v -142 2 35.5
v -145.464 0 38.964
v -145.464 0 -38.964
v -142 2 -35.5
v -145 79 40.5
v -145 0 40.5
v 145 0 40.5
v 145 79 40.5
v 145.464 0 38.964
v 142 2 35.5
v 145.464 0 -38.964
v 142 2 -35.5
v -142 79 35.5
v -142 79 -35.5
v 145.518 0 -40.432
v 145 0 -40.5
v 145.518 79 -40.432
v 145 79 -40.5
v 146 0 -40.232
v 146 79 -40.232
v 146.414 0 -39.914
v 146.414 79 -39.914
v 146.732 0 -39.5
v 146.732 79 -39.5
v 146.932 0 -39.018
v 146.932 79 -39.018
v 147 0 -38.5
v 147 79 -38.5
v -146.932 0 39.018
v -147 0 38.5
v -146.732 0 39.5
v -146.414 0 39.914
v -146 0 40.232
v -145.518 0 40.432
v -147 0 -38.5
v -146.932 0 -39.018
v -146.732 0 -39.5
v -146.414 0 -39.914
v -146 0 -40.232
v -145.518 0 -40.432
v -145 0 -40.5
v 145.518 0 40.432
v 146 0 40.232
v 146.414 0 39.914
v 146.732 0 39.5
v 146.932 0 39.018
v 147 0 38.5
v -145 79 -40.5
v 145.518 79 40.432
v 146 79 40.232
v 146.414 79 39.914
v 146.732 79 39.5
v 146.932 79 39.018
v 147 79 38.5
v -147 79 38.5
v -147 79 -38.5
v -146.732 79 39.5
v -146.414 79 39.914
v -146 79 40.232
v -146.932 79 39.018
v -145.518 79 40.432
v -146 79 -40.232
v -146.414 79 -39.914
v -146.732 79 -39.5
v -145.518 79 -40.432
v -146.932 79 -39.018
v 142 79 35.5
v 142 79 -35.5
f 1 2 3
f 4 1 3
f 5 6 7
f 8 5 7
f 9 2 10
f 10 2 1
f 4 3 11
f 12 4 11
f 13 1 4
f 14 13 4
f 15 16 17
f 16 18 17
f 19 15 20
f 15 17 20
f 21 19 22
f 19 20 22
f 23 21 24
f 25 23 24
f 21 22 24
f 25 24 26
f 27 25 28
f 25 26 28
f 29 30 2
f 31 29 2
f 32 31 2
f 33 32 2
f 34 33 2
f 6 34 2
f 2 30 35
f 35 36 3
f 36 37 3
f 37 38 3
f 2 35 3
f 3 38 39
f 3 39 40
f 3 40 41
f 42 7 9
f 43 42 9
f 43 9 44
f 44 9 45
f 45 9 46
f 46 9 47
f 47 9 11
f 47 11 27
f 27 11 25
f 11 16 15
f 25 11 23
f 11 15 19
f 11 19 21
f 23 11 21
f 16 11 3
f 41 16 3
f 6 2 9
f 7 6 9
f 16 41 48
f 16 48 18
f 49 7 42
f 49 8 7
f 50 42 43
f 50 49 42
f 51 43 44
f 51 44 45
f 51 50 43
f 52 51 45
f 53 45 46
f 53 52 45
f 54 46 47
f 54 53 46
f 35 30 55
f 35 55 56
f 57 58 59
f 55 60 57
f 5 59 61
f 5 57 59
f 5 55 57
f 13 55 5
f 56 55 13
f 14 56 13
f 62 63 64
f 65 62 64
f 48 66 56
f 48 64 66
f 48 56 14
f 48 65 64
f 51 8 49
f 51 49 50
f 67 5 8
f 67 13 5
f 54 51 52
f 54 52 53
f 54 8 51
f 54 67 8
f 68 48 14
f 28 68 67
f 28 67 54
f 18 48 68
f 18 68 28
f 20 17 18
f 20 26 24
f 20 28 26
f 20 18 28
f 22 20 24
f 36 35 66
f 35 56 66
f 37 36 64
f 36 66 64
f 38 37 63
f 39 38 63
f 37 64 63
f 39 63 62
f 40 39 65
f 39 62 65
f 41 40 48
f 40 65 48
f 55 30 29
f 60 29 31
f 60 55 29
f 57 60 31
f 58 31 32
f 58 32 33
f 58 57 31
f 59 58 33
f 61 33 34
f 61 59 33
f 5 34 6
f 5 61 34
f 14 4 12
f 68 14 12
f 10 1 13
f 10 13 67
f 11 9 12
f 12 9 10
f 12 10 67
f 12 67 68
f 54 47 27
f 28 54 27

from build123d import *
from OCP.BRepFilletAPI import BRepFilletAPI_MakeChamfer

# Parameters (mm, degrees)
SKETCH1_W           = 294
SKETCH1_H           = 81
SKETCH1_W_2         = 284
SKETCH1_H_2         = 71
BOSS_EXTRUDE1_DEPTH = 79
FILLET1_R           = 2
CHAMFER1_SIZE       = 2
CHAMFER1_SIZE2      = 3.464101615


with BuildPart() as part:
    # Sketch1 → Boss-Extrude1 (new body)
    with BuildSketch(Plane(origin=(0, 0, 0), x_dir=(1, 0, 0), z_dir=(0, 1, 0))):
        Rectangle(SKETCH1_W, SKETCH1_H)
        Rectangle(SKETCH1_W_2, SKETCH1_H_2, mode=Mode.SUBTRACT)
    extrude(amount=BOSS_EXTRUDE1_DEPTH)

    # Fillet1
    fillet1_edges = [part.edges().sort_by_distance(p)[0] for p in [
        (-147, 39.5, -40.5),
        (147, 39.5, -40.5),
        (147, 39.5, 40.5),
        (-147, 39.5, 40.5),
    ]]
    fillet(fillet1_edges, radius=FILLET1_R)

    # Chamfer1: one chamfer whose edges measure the first distance from different faces: ONE call of the kernel's chamfer builder (chamfer() names one face for all edges)
    chamfer1_edges_1 = [part.edges().sort_by_distance(p)[0] for p in [
        (-142, 0, 0),
    ]]
    chamfer1_side_1 = [part.faces().sort_by_distance(p)[0] for p in [
        (-142, 39.5, 0),
    ]]
    chamfer1_edges_2 = [part.edges().sort_by_distance(p)[0] for p in [
        (0, 0, 35.5),
    ]]
    chamfer1_side_2 = [part.faces().sort_by_distance(p)[0] for p in [
        (0, 39.5, 35.5),
    ]]
    chamfer1_edges_3 = [part.edges().sort_by_distance(p)[0] for p in [
        (142, 0, 0),
    ]]
    chamfer1_side_3 = [part.faces().sort_by_distance(p)[0] for p in [
        (142, 39.5, 0),
    ]]
    chamfer1_edges_4 = [part.edges().sort_by_distance(p)[0] for p in [
        (0, 0, -35.5),
    ]]
    chamfer1_side_4 = [part.faces().sort_by_distance(p)[0] for p in [
        (0, 39.5, -35.5),
    ]]
    chamfer1 = BRepFilletAPI_MakeChamfer(part.part.solid().wrapped)
    for e in chamfer1_edges_1:
        chamfer1.Add(CHAMFER1_SIZE, CHAMFER1_SIZE2, e.wrapped, chamfer1_side_1[0].wrapped)  # the first distance lies on this face
    for e in chamfer1_edges_2:
        chamfer1.Add(CHAMFER1_SIZE, CHAMFER1_SIZE2, e.wrapped, chamfer1_side_2[0].wrapped)  # the first distance lies on this face
    for e in chamfer1_edges_3:
        chamfer1.Add(CHAMFER1_SIZE, CHAMFER1_SIZE2, e.wrapped, chamfer1_side_3[0].wrapped)  # the first distance lies on this face
    for e in chamfer1_edges_4:
        chamfer1.Add(CHAMFER1_SIZE, CHAMFER1_SIZE2, e.wrapped, chamfer1_side_4[0].wrapped)  # the first distance lies on this face
    add(Compound.cast(chamfer1.Shape()), mode=Mode.REPLACE)


solid = part.part
